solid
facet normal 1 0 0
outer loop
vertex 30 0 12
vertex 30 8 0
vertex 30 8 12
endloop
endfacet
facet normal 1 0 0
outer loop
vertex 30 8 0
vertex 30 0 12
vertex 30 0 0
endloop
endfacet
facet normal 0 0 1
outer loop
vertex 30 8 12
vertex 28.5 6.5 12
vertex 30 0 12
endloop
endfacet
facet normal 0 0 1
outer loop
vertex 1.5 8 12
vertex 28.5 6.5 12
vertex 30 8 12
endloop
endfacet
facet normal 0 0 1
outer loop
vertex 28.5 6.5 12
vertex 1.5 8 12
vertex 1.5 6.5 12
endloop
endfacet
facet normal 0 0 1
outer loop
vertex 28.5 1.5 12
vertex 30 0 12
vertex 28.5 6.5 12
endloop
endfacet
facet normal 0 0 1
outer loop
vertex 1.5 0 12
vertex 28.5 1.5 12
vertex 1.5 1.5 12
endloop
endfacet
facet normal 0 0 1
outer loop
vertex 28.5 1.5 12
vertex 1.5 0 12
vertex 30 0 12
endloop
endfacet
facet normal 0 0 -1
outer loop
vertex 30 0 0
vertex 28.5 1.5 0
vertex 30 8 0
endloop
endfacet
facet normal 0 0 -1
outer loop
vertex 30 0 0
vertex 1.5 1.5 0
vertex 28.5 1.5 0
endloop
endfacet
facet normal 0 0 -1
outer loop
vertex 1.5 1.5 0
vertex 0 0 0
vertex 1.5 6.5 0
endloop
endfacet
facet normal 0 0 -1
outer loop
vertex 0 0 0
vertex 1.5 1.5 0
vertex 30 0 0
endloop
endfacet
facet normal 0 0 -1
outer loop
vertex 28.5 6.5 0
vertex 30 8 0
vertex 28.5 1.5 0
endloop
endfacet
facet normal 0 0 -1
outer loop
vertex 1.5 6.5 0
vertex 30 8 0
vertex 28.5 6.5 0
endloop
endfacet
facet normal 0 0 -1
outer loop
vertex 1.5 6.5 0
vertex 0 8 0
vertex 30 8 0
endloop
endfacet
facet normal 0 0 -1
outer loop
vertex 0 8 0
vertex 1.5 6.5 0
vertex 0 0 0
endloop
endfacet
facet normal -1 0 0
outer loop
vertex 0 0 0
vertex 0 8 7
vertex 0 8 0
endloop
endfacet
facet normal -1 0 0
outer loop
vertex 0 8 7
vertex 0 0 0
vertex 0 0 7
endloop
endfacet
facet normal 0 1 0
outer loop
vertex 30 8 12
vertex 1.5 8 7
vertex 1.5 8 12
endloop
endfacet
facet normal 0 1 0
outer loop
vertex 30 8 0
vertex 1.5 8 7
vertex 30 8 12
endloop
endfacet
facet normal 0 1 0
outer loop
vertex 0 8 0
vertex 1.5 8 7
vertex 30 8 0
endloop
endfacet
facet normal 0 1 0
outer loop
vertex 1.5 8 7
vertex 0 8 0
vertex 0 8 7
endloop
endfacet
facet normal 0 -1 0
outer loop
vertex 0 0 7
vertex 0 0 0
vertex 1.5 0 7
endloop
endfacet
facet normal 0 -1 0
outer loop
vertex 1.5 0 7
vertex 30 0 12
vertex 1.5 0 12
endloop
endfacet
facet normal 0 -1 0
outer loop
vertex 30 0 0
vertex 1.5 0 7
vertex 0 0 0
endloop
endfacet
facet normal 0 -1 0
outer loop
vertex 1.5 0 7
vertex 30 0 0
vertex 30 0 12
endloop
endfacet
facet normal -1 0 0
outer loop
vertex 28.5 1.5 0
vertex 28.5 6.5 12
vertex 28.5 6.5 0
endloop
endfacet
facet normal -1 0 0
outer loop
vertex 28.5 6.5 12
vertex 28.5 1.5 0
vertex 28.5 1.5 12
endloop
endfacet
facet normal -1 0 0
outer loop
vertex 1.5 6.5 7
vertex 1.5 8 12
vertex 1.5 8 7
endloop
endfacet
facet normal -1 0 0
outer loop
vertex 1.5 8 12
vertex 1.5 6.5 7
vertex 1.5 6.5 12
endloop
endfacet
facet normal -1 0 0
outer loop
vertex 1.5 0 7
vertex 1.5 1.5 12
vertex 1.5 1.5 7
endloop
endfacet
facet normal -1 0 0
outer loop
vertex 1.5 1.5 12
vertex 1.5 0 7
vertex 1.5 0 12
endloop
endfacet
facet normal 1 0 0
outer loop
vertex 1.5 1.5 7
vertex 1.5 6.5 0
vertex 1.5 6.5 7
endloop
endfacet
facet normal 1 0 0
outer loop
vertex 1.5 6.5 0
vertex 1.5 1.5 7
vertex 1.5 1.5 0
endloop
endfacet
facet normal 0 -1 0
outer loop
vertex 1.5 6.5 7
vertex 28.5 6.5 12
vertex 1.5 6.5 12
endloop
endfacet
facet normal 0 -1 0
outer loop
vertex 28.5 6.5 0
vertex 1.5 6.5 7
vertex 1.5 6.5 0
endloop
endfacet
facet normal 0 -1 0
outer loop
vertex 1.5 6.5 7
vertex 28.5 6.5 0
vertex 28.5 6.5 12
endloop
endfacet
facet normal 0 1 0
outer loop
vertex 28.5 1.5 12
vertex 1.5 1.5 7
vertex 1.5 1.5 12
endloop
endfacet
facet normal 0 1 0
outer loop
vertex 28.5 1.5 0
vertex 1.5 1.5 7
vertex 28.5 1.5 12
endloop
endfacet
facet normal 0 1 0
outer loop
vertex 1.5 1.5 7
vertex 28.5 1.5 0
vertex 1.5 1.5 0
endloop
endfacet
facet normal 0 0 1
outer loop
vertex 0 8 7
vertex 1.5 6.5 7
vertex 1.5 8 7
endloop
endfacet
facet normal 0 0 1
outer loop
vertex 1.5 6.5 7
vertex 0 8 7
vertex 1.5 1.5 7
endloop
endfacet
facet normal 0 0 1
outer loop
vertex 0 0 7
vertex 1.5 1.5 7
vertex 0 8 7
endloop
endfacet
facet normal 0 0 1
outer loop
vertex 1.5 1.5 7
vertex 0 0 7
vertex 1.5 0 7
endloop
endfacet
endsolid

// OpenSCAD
/* This is an enclosure to hold two 10 pins 0.100'' (2.54 mm) female headers.
 * The side notch gives space for the electrical wires.
 */

wall=1.5;
inner_y=5;
inner_x=27;
z=12;

pin_enclosure();

module pin_enclosure () {
	difference(){
		cube([inner_x+2*wall,inner_y+2*wall,z]);
		translate([wall,wall,-1]) cube([inner_x,inner_y,z+2]);
		translate([0,-1,7]) cube([wall,inner_y+2*wall+2,5]);
	}
}
